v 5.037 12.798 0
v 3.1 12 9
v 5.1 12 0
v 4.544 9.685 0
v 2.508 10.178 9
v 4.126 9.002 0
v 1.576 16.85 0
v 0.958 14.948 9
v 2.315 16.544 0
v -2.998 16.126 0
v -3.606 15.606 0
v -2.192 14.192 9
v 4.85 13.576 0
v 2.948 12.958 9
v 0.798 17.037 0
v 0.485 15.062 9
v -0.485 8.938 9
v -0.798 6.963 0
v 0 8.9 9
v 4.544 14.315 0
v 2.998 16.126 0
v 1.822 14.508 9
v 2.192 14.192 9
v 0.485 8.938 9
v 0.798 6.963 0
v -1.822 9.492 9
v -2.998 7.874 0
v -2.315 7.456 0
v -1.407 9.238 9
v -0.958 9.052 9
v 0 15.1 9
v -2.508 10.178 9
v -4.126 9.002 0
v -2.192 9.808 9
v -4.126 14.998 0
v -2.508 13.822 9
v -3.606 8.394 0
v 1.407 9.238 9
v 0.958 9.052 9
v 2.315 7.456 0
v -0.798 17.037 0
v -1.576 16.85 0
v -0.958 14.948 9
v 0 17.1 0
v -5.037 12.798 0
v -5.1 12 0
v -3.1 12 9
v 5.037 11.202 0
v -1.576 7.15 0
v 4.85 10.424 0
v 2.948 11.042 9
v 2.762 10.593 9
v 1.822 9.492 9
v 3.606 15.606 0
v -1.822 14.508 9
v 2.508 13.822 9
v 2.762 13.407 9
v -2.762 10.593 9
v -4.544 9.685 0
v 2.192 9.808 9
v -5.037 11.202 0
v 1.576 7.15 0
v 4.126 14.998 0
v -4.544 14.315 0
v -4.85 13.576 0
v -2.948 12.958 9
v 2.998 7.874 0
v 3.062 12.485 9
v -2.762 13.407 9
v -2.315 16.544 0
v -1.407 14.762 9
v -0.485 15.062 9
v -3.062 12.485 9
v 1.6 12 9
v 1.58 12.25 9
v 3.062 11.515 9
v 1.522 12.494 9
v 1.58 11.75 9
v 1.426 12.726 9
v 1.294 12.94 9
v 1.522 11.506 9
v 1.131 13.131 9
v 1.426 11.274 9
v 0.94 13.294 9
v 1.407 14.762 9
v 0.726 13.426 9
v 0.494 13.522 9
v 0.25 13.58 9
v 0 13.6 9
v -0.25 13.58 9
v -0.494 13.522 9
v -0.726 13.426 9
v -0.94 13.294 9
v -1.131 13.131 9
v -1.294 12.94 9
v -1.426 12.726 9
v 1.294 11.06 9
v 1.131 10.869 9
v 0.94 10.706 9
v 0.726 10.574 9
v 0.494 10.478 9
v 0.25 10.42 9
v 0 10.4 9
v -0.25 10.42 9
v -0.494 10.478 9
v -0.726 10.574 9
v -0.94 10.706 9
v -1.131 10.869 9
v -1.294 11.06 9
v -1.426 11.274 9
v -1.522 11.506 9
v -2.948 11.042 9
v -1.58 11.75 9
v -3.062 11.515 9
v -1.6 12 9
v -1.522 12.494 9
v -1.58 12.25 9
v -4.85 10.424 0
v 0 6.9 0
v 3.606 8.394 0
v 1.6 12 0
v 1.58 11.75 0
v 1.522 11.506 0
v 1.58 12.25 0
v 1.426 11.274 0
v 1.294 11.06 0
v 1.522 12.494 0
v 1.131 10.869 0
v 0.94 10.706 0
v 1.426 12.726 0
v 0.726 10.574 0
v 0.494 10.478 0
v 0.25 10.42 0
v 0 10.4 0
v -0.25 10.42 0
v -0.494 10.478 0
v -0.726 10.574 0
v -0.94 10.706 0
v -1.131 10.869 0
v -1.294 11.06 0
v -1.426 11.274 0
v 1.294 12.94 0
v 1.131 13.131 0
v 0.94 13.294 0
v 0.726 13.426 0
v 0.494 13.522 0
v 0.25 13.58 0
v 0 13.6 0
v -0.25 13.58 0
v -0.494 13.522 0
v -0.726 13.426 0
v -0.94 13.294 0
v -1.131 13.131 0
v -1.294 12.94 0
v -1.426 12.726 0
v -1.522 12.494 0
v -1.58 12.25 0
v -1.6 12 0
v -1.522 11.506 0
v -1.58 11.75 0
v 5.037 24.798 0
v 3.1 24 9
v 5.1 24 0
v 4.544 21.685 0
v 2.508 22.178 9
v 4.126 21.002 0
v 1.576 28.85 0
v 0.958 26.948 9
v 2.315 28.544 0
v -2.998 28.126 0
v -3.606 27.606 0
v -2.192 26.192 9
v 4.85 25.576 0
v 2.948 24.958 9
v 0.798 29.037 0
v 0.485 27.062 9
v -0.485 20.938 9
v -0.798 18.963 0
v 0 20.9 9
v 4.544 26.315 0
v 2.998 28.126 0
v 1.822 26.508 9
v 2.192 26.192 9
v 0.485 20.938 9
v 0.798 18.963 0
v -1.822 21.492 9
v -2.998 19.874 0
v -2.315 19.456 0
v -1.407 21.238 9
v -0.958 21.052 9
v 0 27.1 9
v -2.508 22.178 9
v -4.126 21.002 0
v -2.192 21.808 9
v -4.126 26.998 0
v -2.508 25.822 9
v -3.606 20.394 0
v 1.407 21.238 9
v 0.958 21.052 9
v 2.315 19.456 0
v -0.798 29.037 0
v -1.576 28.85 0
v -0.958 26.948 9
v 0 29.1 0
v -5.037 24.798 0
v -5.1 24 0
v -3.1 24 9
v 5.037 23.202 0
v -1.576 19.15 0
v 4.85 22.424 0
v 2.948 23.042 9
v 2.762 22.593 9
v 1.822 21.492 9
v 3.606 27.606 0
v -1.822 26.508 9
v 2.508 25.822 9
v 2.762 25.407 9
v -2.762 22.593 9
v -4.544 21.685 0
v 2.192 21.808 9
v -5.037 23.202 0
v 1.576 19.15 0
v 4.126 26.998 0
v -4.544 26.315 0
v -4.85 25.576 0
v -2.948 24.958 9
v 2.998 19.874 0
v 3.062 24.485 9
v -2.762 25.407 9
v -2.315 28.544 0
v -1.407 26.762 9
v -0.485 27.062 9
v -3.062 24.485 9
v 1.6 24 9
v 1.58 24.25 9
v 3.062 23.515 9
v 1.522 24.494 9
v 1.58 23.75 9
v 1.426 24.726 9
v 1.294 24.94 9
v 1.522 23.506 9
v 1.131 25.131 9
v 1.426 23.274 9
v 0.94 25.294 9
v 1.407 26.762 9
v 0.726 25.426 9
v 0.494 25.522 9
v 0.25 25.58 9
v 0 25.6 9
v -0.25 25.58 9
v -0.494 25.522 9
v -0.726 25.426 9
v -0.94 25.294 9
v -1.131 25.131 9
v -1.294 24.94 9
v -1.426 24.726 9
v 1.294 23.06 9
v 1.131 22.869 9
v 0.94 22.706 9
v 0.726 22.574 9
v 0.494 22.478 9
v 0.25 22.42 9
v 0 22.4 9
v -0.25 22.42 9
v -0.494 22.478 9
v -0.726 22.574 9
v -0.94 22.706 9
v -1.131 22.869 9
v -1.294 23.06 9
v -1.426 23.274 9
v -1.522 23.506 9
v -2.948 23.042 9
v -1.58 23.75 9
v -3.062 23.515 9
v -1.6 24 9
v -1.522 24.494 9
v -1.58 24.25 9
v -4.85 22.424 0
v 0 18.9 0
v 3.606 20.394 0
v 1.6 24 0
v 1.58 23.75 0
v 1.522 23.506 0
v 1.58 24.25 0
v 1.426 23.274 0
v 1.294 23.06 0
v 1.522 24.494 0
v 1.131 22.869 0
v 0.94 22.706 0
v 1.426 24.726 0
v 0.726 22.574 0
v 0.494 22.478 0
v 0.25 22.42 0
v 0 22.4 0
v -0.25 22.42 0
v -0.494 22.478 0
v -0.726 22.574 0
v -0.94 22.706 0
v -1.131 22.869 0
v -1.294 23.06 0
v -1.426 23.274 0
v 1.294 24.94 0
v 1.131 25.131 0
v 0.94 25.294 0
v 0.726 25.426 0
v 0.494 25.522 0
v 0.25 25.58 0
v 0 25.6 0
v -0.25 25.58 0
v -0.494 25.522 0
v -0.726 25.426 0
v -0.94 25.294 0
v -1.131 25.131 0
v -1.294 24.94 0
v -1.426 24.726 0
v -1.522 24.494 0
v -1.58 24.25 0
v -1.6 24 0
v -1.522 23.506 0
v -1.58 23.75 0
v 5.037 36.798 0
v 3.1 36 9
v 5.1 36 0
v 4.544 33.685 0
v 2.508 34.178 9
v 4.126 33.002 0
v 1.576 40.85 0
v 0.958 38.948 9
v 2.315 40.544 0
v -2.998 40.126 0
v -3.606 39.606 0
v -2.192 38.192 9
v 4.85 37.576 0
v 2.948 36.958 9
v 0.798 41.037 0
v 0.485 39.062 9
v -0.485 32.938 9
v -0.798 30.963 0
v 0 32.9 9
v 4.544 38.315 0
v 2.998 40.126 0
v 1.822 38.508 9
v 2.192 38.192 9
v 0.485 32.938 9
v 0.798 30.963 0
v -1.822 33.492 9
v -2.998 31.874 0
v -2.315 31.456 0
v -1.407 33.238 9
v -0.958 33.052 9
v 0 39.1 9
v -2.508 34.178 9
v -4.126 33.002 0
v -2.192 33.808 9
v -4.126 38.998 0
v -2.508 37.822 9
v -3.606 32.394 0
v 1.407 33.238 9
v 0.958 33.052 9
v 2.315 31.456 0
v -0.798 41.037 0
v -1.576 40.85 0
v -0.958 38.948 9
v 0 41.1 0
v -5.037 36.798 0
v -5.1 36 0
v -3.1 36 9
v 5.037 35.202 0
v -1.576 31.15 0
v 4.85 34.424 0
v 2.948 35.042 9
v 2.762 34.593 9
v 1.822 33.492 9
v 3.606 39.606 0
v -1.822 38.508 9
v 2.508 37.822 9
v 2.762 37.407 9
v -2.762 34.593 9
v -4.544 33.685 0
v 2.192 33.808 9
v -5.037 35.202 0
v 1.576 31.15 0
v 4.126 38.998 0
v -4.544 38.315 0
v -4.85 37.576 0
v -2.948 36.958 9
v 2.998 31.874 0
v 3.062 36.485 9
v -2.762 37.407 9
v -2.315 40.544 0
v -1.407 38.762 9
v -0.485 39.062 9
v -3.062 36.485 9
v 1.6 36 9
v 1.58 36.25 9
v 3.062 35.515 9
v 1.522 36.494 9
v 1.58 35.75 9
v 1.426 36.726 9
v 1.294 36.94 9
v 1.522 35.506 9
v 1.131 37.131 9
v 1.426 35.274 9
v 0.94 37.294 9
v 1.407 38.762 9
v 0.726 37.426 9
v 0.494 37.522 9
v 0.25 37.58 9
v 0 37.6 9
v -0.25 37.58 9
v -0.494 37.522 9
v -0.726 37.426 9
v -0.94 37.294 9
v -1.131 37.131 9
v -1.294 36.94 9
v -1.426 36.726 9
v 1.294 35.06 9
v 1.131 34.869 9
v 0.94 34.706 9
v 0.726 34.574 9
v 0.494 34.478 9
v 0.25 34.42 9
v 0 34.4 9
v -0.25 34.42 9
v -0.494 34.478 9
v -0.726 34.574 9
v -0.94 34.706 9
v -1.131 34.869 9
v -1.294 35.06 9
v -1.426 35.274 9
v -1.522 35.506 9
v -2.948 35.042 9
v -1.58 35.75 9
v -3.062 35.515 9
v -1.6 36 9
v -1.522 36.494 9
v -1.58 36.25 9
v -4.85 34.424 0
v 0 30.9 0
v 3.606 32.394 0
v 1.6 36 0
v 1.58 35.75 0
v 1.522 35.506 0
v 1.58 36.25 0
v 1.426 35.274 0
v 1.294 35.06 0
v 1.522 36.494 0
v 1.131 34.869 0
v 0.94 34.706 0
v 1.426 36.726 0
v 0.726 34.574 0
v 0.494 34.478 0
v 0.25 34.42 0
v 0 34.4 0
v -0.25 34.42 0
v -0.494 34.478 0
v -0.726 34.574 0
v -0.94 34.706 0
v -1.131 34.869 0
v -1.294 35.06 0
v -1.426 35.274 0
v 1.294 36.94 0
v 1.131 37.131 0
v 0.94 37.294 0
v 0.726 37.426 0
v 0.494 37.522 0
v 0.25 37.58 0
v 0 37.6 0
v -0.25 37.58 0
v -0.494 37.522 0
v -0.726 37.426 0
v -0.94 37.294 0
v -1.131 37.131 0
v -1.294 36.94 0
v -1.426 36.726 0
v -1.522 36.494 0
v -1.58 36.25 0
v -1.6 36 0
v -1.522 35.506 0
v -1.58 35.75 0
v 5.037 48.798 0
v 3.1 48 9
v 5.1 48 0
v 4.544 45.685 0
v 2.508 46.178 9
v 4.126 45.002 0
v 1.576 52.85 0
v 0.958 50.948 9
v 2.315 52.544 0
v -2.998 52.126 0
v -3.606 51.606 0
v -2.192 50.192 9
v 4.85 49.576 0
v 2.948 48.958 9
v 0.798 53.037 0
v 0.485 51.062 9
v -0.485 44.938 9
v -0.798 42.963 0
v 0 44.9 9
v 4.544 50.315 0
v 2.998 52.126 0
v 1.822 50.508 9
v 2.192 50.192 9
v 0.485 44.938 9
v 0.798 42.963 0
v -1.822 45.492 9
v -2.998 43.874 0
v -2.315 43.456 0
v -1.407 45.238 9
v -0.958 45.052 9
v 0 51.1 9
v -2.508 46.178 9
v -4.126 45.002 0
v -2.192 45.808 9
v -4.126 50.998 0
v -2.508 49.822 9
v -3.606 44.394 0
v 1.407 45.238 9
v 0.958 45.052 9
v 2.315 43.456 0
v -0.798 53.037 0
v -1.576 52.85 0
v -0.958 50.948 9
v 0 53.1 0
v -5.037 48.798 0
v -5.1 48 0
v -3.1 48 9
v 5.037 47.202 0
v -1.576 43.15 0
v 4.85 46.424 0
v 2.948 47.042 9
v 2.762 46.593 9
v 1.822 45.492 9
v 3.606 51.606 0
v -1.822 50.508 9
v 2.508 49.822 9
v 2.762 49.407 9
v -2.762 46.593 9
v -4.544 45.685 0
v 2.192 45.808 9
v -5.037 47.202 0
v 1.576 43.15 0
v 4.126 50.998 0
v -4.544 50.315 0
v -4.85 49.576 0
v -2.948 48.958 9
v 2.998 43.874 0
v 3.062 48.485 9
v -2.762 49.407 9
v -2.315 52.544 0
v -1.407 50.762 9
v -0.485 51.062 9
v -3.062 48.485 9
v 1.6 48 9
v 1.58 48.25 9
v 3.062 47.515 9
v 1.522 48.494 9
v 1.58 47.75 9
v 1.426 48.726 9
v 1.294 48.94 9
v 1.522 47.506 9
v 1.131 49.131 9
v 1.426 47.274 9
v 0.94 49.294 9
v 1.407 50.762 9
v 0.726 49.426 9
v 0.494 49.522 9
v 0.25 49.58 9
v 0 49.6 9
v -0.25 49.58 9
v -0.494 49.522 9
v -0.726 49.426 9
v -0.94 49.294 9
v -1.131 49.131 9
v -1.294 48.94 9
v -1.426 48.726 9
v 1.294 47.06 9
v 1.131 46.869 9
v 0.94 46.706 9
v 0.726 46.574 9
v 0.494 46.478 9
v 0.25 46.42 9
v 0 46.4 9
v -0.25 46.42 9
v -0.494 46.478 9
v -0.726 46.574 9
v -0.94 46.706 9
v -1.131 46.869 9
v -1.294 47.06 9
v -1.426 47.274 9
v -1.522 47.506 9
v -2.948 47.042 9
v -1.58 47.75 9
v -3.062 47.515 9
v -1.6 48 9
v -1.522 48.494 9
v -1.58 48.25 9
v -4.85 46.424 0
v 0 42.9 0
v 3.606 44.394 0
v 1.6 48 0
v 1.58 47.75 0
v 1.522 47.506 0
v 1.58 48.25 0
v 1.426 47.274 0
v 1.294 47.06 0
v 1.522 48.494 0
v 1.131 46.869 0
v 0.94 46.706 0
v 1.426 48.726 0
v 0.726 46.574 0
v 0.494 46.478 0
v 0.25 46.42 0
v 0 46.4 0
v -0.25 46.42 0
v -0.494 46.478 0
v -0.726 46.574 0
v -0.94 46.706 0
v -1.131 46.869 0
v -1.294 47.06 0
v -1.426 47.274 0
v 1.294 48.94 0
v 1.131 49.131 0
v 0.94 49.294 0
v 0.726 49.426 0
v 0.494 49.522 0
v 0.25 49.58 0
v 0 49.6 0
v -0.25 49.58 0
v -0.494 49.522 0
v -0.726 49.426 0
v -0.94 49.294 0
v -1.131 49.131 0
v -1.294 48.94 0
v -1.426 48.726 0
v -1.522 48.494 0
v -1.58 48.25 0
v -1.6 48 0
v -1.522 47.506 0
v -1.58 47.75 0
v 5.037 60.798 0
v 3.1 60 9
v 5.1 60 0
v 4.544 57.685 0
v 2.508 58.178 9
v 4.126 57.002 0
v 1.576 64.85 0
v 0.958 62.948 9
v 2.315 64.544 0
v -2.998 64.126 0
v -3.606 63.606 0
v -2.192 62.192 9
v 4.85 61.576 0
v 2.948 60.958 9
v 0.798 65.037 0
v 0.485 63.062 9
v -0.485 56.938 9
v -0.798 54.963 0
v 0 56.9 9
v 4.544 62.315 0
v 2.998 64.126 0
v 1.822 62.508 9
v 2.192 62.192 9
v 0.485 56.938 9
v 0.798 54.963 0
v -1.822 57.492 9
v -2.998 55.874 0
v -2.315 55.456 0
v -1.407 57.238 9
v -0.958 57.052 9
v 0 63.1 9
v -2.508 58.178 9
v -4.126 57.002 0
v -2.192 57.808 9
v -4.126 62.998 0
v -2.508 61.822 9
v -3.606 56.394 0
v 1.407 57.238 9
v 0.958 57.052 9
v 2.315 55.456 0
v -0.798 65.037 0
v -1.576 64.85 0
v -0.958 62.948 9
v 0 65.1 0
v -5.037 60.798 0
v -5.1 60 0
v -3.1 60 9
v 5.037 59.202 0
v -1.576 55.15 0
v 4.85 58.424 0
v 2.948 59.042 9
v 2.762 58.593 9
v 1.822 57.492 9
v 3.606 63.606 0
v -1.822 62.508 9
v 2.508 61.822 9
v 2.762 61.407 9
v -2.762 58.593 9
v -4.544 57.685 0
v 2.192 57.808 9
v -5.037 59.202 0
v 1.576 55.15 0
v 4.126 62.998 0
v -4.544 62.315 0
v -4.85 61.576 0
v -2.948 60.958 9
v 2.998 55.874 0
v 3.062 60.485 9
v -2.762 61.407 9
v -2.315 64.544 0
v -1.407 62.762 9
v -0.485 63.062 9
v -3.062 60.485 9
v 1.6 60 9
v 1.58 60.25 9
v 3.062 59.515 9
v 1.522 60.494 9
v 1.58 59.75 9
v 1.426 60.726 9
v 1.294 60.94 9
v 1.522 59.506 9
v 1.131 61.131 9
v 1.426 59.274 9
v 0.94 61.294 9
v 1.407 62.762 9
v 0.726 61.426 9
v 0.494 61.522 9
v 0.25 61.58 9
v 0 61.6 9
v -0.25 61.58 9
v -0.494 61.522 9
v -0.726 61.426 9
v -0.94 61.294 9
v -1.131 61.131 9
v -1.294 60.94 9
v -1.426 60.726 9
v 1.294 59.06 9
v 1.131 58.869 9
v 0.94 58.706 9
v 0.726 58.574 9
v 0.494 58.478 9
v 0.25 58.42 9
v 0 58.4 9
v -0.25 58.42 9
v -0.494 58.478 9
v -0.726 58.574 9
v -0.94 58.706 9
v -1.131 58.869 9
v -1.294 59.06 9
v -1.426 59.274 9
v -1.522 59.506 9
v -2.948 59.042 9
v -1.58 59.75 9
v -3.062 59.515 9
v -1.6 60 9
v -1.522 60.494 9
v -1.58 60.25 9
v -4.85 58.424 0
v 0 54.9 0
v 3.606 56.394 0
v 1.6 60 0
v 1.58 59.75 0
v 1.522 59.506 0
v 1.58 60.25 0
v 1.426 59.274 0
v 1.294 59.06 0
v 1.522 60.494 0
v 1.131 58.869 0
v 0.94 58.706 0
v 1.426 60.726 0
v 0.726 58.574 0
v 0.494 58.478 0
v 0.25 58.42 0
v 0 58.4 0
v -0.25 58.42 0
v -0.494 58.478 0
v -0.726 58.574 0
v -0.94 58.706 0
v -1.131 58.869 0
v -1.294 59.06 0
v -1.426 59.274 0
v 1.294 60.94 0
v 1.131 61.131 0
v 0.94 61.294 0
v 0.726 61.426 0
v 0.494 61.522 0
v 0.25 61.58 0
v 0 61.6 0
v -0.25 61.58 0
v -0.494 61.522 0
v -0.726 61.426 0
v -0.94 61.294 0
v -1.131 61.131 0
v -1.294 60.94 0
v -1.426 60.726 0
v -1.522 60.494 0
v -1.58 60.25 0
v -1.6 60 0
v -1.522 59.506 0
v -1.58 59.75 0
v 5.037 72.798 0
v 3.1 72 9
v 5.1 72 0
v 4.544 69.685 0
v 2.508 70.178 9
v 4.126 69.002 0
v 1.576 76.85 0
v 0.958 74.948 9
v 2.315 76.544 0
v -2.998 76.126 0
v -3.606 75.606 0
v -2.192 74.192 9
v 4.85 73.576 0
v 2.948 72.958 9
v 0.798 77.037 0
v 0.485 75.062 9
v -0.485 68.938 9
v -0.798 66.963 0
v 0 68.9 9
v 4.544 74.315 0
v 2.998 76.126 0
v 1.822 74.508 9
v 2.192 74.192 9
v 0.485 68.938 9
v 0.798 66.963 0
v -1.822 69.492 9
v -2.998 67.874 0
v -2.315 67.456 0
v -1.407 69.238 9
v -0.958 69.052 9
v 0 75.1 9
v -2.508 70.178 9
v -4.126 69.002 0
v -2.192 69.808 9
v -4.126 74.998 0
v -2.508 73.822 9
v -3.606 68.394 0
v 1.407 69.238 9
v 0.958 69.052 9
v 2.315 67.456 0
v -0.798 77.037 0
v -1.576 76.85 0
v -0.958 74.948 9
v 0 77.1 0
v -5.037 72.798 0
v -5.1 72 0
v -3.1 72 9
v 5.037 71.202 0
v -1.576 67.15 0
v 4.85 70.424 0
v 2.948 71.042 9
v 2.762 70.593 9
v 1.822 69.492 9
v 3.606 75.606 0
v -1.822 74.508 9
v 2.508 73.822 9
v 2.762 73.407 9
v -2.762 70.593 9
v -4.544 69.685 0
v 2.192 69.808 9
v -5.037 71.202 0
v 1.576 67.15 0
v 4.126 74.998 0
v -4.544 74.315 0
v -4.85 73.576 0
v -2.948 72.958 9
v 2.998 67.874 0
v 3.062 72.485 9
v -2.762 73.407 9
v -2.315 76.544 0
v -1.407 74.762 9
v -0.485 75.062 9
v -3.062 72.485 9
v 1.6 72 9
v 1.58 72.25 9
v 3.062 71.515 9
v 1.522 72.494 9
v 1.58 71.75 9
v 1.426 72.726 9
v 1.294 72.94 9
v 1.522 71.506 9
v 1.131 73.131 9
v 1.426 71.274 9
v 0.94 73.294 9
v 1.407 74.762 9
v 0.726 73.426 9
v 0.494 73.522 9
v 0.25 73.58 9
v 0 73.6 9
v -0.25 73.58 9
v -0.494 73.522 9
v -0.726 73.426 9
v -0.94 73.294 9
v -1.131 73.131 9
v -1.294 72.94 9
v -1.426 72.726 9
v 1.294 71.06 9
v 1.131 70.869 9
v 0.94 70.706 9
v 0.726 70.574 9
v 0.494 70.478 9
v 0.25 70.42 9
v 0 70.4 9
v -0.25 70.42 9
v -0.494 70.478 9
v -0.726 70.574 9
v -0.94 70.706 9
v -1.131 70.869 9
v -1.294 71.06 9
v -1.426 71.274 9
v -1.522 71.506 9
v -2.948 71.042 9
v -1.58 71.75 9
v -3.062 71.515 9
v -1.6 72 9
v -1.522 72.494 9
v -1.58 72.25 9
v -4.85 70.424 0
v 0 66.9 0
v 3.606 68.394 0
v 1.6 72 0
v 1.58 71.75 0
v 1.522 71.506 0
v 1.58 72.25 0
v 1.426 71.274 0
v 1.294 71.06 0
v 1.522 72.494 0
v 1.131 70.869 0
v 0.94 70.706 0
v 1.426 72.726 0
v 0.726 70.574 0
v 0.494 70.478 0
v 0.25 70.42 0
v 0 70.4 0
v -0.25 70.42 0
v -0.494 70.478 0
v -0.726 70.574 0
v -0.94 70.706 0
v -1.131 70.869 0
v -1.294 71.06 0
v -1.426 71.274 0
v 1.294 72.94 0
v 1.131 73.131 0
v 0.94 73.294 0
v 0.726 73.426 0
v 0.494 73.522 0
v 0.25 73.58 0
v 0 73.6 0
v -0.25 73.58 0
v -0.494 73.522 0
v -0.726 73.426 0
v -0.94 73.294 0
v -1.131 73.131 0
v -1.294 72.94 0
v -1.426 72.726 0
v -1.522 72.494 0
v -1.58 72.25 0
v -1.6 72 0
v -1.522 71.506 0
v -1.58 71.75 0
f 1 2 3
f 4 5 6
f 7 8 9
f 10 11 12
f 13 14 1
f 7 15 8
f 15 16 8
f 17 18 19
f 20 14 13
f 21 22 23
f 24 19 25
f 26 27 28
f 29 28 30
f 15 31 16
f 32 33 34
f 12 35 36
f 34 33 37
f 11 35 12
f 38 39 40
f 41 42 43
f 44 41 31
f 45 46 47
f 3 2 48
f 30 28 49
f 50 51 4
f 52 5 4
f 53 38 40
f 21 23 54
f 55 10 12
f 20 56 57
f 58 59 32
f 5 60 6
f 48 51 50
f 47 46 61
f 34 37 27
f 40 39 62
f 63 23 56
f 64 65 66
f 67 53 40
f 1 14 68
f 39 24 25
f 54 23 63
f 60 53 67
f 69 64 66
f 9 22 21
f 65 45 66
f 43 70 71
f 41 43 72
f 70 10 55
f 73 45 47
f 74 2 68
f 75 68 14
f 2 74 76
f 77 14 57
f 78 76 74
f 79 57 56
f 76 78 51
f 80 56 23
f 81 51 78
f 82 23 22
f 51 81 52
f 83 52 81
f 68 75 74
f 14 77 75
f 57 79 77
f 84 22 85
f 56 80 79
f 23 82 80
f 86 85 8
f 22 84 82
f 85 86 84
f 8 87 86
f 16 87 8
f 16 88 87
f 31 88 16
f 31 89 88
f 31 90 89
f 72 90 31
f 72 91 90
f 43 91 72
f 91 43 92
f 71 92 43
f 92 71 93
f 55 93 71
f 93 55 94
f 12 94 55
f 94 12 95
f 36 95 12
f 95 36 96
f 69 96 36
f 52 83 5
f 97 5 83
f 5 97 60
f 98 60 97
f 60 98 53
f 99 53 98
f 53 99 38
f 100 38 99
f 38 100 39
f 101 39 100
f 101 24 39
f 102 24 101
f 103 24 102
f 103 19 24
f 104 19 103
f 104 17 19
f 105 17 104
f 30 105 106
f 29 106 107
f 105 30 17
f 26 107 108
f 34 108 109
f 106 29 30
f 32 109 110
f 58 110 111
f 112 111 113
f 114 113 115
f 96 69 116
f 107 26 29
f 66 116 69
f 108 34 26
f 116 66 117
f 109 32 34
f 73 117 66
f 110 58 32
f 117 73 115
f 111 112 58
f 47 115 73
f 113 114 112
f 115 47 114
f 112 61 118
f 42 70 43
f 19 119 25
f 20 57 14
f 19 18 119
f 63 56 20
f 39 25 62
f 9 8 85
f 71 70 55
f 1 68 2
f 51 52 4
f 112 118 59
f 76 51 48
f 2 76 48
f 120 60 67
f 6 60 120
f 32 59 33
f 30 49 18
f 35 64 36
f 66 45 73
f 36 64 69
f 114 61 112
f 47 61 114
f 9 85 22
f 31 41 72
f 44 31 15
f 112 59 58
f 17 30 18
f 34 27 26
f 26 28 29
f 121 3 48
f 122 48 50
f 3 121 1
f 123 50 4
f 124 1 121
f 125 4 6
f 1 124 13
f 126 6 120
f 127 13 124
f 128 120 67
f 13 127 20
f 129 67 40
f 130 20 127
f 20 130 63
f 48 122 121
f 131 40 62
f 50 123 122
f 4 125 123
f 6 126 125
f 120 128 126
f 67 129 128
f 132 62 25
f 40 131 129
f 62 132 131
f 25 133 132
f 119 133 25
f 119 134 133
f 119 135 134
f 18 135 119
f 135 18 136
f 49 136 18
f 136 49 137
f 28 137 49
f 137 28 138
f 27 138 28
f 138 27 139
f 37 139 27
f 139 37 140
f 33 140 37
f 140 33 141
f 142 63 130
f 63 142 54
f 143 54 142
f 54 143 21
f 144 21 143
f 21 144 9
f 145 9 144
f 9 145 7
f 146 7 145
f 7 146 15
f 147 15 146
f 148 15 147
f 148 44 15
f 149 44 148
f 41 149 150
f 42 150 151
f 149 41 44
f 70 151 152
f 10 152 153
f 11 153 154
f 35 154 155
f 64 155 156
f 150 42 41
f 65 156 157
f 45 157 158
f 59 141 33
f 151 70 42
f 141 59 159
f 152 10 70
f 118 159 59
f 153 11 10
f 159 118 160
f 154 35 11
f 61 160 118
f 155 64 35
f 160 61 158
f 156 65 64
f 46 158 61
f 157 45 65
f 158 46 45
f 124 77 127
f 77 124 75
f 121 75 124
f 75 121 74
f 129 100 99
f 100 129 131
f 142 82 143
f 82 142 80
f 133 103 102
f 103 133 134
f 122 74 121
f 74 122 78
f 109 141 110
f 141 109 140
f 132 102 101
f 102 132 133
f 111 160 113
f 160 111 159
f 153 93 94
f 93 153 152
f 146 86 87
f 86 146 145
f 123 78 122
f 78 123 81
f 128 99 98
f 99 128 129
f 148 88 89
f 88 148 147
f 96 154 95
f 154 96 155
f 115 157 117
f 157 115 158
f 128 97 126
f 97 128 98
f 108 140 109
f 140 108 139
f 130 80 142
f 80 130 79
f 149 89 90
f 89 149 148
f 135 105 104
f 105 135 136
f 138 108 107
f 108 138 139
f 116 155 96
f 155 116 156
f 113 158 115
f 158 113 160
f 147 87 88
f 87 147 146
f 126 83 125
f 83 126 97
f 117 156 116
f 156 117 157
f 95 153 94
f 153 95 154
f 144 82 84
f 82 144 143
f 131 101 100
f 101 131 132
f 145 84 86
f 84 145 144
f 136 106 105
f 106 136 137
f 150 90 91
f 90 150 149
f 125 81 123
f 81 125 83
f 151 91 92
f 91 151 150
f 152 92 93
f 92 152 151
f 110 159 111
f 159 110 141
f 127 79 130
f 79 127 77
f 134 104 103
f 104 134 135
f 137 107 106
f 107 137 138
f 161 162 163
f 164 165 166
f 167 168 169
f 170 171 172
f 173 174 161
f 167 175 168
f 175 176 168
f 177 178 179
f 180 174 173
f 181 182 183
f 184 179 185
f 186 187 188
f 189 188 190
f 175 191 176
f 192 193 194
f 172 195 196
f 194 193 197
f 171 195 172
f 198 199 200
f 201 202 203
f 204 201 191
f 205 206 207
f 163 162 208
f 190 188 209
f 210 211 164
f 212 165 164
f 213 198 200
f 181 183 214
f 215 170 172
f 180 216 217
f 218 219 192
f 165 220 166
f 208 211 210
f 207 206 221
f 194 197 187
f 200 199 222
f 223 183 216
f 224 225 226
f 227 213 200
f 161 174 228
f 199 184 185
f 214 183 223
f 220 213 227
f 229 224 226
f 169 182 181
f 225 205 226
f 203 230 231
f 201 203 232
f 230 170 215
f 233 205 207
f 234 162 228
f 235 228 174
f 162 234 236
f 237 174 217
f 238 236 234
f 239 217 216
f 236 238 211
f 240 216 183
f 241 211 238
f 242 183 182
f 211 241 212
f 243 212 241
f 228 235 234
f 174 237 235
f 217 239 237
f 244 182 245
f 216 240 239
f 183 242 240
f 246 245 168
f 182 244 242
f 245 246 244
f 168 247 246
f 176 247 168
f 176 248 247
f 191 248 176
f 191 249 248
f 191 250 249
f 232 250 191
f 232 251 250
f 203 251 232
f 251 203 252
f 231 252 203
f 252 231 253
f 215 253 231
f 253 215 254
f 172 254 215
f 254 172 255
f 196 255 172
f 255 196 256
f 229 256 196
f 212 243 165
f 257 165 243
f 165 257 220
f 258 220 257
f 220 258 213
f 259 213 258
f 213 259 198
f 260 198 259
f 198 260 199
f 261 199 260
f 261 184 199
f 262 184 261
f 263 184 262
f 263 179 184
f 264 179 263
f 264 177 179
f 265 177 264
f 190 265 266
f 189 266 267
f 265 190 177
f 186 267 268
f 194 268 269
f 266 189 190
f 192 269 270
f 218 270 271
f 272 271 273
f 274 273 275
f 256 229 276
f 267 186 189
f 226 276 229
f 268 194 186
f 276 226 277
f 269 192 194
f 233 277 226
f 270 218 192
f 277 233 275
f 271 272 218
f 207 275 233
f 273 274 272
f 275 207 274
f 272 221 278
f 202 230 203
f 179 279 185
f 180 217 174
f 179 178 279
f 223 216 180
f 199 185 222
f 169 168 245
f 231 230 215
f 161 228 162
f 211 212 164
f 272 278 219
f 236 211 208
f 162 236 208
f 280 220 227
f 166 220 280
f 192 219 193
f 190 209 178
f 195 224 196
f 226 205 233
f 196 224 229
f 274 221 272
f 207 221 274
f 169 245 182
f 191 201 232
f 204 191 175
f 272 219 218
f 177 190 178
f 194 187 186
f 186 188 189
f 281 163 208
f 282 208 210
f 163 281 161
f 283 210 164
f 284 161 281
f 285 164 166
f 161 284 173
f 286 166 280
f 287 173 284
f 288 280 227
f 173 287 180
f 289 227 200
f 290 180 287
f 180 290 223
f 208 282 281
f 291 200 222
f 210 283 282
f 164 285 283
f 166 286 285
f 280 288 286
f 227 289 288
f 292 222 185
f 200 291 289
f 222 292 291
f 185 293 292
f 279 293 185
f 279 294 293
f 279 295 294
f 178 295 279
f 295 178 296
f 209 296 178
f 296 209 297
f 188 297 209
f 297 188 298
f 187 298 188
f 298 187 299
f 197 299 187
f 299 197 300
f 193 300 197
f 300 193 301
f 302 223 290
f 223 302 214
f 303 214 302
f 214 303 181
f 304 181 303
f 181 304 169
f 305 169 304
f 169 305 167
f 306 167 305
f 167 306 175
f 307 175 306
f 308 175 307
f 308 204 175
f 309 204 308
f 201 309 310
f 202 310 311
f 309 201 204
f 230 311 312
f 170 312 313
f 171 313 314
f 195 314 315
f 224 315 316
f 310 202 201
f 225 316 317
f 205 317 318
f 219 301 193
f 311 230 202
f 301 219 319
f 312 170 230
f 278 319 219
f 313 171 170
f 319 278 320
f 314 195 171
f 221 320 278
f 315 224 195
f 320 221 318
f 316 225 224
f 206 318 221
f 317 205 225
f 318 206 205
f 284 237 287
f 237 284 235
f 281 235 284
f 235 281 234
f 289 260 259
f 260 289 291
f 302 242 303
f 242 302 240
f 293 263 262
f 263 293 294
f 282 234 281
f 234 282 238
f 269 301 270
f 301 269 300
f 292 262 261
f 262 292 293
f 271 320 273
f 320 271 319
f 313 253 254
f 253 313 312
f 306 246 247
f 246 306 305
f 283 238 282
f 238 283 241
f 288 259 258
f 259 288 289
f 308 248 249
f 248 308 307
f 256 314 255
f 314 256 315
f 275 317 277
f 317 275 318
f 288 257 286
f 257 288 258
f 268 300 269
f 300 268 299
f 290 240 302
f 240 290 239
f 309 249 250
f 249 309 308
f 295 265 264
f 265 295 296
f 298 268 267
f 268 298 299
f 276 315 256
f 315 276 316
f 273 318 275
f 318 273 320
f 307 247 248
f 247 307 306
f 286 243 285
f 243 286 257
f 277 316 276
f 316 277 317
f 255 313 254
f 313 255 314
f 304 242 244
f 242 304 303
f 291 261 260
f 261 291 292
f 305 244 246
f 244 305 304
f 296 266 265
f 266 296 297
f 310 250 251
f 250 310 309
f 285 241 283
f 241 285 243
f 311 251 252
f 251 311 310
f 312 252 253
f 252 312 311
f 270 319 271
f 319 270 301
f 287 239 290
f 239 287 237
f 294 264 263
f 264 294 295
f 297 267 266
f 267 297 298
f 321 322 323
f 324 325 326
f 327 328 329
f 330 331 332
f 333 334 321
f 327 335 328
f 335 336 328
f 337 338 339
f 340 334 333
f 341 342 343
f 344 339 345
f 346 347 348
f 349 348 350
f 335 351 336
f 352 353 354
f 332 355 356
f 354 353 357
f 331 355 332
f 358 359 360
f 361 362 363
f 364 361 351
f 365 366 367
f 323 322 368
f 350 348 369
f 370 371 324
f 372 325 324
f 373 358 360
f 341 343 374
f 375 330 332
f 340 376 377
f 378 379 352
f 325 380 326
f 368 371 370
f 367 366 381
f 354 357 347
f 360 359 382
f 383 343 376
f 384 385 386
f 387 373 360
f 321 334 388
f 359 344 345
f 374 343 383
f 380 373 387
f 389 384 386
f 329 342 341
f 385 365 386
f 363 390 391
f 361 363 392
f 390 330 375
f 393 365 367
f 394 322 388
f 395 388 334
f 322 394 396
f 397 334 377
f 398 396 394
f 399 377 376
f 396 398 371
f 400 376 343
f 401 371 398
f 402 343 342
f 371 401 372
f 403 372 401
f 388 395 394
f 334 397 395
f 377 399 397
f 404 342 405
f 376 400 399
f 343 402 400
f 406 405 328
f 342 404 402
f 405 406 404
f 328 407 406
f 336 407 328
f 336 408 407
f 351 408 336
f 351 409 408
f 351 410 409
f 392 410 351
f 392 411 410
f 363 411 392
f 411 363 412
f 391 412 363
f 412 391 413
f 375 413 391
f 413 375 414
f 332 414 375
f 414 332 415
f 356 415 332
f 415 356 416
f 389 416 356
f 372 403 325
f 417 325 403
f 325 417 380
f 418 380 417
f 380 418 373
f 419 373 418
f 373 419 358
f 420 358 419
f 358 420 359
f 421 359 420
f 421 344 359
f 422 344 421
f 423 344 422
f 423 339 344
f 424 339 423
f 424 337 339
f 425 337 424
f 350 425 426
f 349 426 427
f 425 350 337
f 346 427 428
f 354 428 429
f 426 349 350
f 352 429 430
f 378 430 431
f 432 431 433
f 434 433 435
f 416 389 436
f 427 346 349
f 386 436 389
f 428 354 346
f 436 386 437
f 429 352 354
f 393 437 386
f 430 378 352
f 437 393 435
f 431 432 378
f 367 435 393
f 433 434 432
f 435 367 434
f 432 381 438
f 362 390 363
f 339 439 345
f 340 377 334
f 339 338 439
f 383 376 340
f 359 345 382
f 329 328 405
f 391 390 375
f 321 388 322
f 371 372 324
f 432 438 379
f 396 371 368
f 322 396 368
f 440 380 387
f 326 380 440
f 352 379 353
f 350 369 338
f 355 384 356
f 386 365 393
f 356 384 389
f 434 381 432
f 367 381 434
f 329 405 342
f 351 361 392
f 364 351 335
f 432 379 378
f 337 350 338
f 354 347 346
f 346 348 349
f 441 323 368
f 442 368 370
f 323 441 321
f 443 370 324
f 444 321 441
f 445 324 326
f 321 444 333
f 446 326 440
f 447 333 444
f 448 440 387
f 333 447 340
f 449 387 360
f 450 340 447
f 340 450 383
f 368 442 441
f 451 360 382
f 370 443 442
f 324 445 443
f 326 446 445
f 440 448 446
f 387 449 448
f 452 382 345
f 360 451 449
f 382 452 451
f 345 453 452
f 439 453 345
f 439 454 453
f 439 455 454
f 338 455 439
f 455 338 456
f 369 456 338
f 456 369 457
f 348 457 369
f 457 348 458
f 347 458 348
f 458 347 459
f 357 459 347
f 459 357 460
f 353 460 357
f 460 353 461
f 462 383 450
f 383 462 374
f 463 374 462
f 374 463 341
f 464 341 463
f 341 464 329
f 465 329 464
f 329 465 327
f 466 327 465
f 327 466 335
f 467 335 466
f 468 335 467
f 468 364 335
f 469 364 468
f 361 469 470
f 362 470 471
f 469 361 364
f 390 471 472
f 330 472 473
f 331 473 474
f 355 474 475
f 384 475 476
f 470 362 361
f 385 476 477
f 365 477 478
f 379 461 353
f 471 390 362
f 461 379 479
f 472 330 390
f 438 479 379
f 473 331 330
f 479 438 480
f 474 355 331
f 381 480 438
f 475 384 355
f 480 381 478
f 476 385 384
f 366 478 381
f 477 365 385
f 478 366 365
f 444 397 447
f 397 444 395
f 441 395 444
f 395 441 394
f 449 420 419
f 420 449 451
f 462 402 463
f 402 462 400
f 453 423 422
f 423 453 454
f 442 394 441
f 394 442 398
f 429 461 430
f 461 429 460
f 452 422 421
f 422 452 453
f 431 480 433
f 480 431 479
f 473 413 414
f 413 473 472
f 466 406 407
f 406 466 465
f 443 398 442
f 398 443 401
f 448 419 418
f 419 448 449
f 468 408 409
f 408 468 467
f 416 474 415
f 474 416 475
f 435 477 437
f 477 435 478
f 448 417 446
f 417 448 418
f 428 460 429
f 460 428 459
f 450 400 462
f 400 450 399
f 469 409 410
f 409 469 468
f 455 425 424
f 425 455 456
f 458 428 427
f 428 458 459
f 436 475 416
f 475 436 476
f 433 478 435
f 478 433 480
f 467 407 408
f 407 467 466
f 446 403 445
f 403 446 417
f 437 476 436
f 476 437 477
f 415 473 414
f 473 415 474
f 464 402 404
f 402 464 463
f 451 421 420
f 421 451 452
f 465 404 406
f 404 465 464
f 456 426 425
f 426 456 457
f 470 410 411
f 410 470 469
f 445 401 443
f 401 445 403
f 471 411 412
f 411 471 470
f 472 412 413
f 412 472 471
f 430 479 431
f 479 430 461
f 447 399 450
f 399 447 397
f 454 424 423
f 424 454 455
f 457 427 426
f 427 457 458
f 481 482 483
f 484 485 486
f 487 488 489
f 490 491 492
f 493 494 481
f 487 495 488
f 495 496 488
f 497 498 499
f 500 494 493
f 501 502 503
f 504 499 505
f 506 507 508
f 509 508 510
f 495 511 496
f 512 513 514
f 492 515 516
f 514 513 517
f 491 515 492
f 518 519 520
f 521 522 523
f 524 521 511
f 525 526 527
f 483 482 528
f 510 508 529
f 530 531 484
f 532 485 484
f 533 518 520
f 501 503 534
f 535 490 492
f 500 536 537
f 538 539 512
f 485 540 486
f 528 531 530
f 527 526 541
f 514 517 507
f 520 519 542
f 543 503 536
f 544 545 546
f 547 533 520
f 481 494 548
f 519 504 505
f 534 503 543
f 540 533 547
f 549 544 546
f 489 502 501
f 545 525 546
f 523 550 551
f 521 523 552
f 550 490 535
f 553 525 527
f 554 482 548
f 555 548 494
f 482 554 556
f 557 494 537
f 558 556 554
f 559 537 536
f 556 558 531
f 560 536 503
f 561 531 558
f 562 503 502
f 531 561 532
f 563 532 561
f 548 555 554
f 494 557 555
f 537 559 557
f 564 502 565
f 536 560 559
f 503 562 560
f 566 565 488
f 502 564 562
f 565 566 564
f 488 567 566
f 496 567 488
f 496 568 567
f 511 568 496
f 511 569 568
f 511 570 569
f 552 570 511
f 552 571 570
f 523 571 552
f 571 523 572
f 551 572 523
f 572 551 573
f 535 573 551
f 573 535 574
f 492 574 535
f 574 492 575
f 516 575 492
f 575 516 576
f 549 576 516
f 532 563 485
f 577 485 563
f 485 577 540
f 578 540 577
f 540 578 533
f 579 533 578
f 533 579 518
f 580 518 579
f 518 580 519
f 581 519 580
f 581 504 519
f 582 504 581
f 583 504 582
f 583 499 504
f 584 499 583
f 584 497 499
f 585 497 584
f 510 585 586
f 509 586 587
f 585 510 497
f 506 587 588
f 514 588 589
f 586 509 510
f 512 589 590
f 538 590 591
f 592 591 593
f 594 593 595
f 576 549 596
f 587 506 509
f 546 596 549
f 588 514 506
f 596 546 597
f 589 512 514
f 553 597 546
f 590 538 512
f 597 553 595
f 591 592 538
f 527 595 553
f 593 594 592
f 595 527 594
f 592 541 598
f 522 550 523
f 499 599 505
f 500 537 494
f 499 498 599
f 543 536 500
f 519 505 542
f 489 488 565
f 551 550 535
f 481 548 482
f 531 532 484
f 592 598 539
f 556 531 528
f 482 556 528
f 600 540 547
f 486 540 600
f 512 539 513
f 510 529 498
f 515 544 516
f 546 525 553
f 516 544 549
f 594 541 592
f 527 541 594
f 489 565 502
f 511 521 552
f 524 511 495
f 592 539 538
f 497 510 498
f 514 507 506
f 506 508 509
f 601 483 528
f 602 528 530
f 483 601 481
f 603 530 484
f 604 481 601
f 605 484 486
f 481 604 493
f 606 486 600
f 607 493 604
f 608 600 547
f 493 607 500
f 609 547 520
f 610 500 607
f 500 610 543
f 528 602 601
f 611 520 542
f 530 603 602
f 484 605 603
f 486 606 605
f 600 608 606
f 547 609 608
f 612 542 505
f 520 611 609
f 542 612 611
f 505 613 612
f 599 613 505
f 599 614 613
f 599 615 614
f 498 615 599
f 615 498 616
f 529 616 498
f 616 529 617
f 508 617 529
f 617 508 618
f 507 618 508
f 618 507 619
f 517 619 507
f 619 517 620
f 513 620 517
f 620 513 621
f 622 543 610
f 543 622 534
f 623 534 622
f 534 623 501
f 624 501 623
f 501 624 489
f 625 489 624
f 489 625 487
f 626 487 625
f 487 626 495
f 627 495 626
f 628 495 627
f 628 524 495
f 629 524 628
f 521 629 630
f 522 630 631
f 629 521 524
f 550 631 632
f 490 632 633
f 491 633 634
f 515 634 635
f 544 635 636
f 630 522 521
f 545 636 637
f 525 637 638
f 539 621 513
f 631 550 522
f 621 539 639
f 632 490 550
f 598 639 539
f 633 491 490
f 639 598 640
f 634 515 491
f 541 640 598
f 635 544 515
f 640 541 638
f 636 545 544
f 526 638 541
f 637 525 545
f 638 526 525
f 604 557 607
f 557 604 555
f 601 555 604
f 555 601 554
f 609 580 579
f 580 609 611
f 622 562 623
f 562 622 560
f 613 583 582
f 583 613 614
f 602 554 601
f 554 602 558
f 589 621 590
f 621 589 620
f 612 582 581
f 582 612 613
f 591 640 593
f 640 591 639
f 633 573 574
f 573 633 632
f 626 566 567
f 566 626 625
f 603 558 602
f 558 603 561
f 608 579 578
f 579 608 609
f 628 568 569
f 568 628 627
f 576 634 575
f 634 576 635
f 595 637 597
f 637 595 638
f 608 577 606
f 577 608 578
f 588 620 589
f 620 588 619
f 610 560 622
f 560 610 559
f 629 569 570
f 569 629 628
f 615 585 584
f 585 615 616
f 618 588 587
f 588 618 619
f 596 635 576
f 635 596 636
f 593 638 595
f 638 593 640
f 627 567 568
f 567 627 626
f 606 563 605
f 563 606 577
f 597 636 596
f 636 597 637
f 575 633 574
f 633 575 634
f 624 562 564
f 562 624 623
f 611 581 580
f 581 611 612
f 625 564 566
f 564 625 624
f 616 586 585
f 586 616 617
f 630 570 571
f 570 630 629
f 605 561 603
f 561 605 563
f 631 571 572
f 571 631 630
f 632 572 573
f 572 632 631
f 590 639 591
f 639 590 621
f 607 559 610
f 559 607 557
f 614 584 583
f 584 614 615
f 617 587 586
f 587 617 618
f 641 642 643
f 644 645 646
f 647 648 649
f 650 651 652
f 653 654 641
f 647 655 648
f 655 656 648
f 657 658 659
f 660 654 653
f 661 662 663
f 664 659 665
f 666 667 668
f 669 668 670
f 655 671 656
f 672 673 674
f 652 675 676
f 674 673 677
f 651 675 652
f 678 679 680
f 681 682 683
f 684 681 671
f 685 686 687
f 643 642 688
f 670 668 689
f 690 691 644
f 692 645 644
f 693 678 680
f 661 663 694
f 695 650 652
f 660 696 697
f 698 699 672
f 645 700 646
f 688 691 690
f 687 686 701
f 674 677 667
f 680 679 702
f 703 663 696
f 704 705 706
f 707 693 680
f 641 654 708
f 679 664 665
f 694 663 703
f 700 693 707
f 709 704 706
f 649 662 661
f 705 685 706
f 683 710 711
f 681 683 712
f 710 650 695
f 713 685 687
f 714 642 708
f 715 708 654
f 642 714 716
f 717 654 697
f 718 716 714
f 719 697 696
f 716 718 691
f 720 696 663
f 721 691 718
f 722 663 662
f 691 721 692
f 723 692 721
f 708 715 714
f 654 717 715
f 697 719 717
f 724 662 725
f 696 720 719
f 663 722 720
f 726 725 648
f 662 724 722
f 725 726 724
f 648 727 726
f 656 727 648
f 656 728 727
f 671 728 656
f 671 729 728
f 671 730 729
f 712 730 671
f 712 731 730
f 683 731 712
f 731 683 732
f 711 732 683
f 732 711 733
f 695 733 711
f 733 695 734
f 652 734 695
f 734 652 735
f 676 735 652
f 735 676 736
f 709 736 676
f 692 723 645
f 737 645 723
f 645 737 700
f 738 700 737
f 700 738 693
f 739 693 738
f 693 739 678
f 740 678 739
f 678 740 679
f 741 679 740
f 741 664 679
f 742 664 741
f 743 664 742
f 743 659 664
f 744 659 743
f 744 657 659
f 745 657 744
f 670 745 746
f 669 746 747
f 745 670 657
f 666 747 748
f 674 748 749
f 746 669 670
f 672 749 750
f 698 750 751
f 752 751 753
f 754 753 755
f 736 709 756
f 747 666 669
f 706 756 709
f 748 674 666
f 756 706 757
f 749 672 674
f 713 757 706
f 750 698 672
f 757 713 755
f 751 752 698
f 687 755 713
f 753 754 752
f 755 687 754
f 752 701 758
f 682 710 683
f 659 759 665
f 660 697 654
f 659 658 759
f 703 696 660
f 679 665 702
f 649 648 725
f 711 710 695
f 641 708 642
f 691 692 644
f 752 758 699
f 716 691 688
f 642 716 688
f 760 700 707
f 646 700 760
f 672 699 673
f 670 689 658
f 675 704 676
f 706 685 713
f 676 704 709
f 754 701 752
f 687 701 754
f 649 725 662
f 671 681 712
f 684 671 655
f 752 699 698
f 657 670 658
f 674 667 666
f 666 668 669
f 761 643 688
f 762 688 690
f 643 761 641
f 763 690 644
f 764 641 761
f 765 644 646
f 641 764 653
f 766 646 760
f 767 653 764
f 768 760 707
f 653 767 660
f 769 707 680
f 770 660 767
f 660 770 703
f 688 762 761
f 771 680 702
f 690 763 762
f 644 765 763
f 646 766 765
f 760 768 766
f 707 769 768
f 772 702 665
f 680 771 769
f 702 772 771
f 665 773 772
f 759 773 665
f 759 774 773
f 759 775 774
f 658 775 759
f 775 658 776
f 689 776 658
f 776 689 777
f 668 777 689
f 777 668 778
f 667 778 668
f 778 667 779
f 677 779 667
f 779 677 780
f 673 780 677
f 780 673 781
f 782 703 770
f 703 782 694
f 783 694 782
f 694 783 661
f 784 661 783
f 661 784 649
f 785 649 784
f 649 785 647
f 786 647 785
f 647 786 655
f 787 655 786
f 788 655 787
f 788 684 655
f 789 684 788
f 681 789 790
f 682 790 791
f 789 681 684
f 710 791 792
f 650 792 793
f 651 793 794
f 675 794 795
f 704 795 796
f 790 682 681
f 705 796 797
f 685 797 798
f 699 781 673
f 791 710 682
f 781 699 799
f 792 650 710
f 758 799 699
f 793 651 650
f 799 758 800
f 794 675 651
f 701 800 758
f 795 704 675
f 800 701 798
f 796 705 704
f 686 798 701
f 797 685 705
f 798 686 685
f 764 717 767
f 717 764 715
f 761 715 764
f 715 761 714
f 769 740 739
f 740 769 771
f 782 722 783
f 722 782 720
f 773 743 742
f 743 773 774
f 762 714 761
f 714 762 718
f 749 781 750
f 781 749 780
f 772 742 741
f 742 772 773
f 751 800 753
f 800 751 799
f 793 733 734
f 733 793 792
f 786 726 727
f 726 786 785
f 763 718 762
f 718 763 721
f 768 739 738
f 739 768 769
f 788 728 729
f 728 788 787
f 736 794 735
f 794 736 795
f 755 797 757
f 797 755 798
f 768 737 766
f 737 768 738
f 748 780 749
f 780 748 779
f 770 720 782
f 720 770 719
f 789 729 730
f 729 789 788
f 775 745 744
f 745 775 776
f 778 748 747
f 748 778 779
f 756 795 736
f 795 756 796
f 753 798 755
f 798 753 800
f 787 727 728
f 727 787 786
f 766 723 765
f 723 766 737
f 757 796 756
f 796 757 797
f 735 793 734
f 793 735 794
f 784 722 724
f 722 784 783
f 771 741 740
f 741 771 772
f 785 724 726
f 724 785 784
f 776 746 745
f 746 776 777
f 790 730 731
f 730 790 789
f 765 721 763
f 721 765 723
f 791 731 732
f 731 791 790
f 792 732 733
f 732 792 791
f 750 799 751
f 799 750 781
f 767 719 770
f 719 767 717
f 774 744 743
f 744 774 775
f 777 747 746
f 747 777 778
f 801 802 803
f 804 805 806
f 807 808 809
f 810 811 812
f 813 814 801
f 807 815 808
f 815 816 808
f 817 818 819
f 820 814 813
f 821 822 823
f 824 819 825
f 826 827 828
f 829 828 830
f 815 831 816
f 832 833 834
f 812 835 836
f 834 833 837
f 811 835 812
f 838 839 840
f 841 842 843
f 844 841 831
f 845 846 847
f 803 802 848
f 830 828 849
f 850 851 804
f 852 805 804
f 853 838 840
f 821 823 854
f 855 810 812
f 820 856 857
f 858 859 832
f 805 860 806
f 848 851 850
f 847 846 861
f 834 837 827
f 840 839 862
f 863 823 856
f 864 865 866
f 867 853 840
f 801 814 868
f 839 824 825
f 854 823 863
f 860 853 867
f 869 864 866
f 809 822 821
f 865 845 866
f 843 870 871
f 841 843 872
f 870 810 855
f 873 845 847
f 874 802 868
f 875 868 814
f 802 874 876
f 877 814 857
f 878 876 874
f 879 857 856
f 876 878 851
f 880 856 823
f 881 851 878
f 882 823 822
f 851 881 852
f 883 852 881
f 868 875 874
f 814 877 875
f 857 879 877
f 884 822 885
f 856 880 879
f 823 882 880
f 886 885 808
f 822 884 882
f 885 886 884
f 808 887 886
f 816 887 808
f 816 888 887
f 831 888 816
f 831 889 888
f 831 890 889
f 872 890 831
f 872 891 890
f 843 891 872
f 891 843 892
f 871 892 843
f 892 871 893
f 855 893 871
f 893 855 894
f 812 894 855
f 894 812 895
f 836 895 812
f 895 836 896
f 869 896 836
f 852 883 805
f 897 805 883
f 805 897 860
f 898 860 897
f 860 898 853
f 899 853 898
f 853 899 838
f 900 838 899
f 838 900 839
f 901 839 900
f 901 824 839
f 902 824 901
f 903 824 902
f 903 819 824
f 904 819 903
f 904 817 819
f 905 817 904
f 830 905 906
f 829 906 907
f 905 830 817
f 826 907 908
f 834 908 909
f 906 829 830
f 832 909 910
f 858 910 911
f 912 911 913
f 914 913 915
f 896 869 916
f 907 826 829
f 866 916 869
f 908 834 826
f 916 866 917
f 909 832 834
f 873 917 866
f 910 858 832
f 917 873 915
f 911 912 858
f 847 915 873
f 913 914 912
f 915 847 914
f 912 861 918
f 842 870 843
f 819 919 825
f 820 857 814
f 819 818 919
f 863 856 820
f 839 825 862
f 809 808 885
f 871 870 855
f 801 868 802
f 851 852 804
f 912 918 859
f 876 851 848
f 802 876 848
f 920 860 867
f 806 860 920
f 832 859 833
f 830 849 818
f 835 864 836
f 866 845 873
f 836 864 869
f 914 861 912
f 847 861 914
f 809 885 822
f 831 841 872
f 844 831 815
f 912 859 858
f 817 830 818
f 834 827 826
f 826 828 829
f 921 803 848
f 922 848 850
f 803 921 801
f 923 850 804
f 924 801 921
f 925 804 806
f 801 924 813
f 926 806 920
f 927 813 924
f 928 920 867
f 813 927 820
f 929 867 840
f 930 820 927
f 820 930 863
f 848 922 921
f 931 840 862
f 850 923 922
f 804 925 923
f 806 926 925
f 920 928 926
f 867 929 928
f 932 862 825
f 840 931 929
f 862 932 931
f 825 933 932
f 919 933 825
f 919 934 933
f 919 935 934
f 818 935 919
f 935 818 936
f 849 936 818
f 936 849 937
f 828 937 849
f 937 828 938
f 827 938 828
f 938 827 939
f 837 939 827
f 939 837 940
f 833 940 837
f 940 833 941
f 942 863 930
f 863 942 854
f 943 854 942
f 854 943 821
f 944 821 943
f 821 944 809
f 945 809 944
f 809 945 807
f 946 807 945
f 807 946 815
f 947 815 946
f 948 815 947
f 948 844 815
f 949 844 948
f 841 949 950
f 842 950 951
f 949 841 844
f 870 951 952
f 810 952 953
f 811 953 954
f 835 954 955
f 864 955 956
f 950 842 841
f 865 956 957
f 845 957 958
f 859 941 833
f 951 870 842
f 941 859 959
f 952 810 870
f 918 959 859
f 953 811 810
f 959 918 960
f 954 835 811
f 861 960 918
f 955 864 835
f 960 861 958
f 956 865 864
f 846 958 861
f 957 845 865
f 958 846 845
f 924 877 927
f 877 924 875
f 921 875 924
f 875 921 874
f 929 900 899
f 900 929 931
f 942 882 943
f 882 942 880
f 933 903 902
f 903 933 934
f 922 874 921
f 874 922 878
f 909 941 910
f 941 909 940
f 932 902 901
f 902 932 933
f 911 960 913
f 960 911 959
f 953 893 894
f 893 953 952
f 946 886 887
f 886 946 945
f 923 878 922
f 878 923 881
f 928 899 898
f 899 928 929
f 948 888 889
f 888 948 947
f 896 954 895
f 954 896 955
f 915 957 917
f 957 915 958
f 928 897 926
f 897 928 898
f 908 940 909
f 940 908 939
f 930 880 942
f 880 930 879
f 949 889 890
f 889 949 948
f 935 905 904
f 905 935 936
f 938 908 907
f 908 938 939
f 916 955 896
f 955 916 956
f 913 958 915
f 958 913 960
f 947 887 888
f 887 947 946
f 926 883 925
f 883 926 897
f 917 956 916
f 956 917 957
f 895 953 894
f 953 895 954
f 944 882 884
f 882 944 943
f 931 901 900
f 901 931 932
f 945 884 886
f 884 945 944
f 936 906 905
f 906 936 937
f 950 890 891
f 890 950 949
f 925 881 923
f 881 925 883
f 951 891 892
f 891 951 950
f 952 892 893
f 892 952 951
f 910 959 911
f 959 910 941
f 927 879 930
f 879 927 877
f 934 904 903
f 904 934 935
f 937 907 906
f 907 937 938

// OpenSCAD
hole_rad = 3.2/2;
spacer_rad = 6.2/2;
spacer_h = 9;


for(i= [1:6]) {
    translate([0, i*12, 0]) difference() {
        cylinder(h=spacer_h, r1=spacer_rad+2, r2 = spacer_rad, $fn=40);
        translate([0,0,-1]) cylinder(h=spacer_h+2, r=hole_rad, $fn=40);
    }
}
